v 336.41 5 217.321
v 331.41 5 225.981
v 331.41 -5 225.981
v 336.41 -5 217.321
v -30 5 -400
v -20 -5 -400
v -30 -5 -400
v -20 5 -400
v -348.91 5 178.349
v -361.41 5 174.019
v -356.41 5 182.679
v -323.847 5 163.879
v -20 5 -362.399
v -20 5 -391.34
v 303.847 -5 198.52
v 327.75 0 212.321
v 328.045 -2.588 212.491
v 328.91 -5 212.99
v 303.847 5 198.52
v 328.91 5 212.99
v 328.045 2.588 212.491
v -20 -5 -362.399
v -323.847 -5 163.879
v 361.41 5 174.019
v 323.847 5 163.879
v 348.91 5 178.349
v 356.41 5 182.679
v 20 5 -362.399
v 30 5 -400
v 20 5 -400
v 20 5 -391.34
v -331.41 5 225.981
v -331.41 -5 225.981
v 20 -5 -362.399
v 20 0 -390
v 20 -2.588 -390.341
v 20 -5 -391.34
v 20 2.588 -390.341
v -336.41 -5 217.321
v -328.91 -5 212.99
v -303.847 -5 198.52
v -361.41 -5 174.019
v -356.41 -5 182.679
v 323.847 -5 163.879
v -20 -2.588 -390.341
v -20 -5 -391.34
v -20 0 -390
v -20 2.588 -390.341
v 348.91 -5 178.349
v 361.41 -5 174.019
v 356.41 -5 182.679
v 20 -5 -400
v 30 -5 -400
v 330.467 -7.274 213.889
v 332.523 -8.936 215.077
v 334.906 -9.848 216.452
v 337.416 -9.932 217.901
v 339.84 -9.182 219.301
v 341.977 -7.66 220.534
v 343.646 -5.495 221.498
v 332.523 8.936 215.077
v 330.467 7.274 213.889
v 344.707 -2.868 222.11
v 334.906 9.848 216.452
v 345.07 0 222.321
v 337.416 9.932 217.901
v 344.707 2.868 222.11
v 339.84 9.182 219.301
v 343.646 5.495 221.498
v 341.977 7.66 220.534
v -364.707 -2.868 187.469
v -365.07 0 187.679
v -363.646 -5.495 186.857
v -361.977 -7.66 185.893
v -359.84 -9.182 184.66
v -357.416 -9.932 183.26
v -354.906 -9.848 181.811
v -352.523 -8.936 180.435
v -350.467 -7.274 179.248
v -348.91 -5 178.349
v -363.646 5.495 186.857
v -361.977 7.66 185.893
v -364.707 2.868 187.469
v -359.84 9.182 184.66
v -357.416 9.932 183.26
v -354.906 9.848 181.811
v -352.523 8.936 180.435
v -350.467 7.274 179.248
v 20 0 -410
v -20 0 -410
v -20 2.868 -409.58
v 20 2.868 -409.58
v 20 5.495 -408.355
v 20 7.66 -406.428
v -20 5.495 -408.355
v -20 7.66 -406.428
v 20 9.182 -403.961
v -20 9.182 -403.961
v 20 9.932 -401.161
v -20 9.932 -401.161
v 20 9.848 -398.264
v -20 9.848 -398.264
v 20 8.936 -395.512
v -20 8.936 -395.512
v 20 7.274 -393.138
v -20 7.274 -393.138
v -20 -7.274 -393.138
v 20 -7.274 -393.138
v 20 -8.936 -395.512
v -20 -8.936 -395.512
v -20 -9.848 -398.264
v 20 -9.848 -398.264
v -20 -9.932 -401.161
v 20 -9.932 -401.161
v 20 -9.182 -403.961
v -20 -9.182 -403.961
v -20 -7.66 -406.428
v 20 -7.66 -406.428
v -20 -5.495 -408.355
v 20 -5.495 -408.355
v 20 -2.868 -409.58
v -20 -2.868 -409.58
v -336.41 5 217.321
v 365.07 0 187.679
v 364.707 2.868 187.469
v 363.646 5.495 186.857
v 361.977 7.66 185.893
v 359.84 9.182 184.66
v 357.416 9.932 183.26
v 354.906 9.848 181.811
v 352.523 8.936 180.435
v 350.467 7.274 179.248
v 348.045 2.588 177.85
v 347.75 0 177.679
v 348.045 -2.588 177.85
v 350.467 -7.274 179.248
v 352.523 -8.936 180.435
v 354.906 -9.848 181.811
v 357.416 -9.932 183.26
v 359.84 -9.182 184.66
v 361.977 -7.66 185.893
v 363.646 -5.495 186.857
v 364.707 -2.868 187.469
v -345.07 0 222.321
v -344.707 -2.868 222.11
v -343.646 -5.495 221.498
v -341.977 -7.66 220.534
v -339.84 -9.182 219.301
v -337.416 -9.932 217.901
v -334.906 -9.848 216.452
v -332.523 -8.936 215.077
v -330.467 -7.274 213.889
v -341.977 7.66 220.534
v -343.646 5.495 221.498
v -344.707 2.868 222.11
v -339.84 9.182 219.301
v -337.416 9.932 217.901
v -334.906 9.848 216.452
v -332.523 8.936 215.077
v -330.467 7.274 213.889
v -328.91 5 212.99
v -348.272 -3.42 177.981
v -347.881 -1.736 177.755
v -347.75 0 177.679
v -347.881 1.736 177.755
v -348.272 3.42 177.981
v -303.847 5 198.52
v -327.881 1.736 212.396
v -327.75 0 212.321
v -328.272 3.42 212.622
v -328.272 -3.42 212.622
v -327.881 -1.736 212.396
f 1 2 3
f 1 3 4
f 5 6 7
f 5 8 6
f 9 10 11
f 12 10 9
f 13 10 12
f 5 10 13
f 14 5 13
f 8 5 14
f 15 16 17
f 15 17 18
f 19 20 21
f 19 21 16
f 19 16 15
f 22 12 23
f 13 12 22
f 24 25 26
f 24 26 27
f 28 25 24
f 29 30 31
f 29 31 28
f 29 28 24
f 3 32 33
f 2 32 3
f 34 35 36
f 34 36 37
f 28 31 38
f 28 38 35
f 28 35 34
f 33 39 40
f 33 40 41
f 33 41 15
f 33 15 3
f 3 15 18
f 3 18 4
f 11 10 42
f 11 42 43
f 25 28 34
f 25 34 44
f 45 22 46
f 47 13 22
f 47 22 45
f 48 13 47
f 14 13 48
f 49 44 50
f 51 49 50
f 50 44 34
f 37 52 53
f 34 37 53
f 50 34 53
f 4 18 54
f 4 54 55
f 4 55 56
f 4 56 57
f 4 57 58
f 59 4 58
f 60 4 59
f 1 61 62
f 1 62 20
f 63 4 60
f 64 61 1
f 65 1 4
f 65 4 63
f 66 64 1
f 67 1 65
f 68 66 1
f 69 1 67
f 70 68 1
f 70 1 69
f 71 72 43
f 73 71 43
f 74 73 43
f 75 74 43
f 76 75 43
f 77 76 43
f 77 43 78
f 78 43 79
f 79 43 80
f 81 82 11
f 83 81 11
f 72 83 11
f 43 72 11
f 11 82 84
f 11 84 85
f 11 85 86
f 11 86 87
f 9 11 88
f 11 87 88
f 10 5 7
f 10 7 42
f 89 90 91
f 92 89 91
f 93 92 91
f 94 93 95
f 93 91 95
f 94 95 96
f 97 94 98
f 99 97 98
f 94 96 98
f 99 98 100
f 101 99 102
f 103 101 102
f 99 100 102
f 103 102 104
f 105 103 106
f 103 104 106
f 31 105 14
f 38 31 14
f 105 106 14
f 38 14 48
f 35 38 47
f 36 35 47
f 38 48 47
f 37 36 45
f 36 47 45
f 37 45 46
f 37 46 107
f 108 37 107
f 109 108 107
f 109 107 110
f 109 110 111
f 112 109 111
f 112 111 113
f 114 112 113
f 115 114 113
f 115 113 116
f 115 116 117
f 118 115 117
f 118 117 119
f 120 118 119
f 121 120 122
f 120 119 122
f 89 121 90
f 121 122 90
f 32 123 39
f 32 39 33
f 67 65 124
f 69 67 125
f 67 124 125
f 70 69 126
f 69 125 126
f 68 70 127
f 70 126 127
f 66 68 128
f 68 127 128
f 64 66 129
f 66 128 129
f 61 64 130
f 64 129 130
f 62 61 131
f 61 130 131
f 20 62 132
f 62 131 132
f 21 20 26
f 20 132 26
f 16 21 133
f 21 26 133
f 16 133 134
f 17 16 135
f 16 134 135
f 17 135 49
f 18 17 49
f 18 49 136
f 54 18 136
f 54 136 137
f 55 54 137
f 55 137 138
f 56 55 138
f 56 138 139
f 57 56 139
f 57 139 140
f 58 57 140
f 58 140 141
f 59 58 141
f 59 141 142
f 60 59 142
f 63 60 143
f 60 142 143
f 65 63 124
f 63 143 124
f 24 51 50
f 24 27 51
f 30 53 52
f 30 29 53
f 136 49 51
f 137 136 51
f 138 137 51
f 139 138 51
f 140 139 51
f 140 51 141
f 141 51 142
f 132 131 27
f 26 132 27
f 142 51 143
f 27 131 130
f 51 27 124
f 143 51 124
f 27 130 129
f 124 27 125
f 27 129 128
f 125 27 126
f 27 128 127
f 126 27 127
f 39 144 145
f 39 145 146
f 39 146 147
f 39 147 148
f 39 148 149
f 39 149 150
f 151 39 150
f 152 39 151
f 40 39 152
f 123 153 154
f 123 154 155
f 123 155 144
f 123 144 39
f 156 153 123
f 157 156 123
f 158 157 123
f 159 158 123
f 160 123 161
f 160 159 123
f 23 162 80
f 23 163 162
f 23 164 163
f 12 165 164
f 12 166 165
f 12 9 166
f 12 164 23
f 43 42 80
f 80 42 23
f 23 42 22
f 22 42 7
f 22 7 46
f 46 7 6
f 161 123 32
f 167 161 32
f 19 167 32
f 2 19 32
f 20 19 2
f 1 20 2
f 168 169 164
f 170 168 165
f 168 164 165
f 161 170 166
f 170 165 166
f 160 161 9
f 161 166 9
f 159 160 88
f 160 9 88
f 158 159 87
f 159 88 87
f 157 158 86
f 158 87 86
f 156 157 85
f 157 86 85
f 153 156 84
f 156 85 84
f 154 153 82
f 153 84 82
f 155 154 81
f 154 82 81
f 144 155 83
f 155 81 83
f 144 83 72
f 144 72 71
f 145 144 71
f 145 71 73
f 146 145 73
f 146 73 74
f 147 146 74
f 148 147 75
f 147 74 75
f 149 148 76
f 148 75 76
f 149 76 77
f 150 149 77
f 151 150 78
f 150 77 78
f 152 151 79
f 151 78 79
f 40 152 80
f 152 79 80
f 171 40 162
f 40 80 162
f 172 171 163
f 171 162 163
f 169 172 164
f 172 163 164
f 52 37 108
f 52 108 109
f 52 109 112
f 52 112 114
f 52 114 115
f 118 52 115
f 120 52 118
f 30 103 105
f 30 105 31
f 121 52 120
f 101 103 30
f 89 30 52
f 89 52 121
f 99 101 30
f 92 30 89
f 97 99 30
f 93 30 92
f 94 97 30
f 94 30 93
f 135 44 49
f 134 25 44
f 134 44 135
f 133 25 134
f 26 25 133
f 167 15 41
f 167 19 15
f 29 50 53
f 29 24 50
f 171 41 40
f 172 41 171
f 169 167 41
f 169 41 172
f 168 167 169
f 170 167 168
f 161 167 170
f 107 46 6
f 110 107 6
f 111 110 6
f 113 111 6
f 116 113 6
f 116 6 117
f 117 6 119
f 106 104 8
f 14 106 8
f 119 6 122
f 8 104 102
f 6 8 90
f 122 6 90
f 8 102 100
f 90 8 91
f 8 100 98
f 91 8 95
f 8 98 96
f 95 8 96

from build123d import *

# Parameters (mm, degrees)
SALIENTE_EXTRUIR2_DEPTH   = 5
SALIENTE_EXTRUIR2_2_DEPTH = 5
SALIENTE_EXTRUIR2_3_DEPTH = 5
SALIENTE_EXTRUIR3_START   = -20
CROQUIS5_R                = 10
SALIENTE_EXTRUIR3_DEPTH   = 40
CROQUIS6_R                = 10
SALIENTE_EXTRUIR4_DEPTH   = 40
CROQUIS7_R                = 10
SALIENTE_EXTRUIR5_DEPTH   = 40


with BuildPart() as part:
    # Croquis4 → Saliente-Extruir2 (new body, symmetric)
    with BuildSketch(Plane(origin=(0, 0, 0), x_dir=(1, 0, 0), z_dir=(0, 1, 0))):
        Polygon((-303.846502665, -198.519870873), (-336.410161514, -217.320508076), (-331.410161514, -225.980762114), (331.410161514, -225.980762114), (336.410161514, -217.320508076), (303.846502665, -198.519870873), align=None)
    extrude(amount=SALIENTE_EXTRUIR2_DEPTH, both=True)



with BuildPart() as body_2:
    # Croquis4 → Saliente-Extruir2 2 (new body, symmetric)
    with BuildSketch(Plane(origin=(0, 0, 0), x_dir=(1, 0, 0), z_dir=(0, 1, 0))):
        Polygon((-20, 400), (-30, 400), (-361.410161514, -174.019237886), (-356.410161514, -182.679491924), (-323.846502665, -163.878854722), (-20, 362.398725595), align=None)
    extrude(amount=SALIENTE_EXTRUIR2_2_DEPTH, both=True)



with BuildPart() as body_3:
    # Croquis4 → Saliente-Extruir2 3 (new body, symmetric)
    with BuildSketch(Plane(origin=(0, 0, 0), x_dir=(1, 0, 0), z_dir=(0, 1, 0))):
        Polygon((30, 400), (20, 400), (20, 362.398725595), (323.846502665, -163.878854722), (356.410161514, -182.679491924), (361.410161514, -174.019237886), align=None)
    extrude(amount=SALIENTE_EXTRUIR2_3_DEPTH, both=True)


with BuildPart() as body_2_1:
    add(body_2.part)

    add(body_3.part)  # Saliente-Extruir3 merges body 3
    # Croquis5 → Saliente-Extruir3 (add)
    with BuildSketch(Plane(origin=(0, 0, 0), x_dir=(0, 0, -1), z_dir=(1, 0, 0)).offset(SALIENTE_EXTRUIR3_START)):
        with Locations((400, 0)):
            Circle(CROQUIS5_R)
    extrude(amount=SALIENTE_EXTRUIR3_DEPTH)


with BuildPart() as part_1:
    add(part.part)

    add(body_2_1.part)  # Saliente-Extruir4 merges body 2
    # Croquis6 → Saliente-Extruir4 (add)
    with BuildSketch(Plane(origin=(-10, 0, -17.320508076), x_dir=(0.866025404, 0, -0.5), z_dir=(0.5, 0, 0.866025404))):
        with Locations((-400, 0)):
            Circle(CROQUIS6_R)
    extrude(amount=SALIENTE_EXTRUIR4_DEPTH)

    # Croquis7 → Saliente-Extruir5 (add)
    with BuildSketch(Plane(origin=(10, 0, -17.320508076), x_dir=(0.866025404, 0, 0.5), z_dir=(-0.5, 0, 0.866025404))):
        with Locations((400, 0)):
            Circle(CROQUIS7_R)
    extrude(amount=SALIENTE_EXTRUIR5_DEPTH)


solid = part_1.part
